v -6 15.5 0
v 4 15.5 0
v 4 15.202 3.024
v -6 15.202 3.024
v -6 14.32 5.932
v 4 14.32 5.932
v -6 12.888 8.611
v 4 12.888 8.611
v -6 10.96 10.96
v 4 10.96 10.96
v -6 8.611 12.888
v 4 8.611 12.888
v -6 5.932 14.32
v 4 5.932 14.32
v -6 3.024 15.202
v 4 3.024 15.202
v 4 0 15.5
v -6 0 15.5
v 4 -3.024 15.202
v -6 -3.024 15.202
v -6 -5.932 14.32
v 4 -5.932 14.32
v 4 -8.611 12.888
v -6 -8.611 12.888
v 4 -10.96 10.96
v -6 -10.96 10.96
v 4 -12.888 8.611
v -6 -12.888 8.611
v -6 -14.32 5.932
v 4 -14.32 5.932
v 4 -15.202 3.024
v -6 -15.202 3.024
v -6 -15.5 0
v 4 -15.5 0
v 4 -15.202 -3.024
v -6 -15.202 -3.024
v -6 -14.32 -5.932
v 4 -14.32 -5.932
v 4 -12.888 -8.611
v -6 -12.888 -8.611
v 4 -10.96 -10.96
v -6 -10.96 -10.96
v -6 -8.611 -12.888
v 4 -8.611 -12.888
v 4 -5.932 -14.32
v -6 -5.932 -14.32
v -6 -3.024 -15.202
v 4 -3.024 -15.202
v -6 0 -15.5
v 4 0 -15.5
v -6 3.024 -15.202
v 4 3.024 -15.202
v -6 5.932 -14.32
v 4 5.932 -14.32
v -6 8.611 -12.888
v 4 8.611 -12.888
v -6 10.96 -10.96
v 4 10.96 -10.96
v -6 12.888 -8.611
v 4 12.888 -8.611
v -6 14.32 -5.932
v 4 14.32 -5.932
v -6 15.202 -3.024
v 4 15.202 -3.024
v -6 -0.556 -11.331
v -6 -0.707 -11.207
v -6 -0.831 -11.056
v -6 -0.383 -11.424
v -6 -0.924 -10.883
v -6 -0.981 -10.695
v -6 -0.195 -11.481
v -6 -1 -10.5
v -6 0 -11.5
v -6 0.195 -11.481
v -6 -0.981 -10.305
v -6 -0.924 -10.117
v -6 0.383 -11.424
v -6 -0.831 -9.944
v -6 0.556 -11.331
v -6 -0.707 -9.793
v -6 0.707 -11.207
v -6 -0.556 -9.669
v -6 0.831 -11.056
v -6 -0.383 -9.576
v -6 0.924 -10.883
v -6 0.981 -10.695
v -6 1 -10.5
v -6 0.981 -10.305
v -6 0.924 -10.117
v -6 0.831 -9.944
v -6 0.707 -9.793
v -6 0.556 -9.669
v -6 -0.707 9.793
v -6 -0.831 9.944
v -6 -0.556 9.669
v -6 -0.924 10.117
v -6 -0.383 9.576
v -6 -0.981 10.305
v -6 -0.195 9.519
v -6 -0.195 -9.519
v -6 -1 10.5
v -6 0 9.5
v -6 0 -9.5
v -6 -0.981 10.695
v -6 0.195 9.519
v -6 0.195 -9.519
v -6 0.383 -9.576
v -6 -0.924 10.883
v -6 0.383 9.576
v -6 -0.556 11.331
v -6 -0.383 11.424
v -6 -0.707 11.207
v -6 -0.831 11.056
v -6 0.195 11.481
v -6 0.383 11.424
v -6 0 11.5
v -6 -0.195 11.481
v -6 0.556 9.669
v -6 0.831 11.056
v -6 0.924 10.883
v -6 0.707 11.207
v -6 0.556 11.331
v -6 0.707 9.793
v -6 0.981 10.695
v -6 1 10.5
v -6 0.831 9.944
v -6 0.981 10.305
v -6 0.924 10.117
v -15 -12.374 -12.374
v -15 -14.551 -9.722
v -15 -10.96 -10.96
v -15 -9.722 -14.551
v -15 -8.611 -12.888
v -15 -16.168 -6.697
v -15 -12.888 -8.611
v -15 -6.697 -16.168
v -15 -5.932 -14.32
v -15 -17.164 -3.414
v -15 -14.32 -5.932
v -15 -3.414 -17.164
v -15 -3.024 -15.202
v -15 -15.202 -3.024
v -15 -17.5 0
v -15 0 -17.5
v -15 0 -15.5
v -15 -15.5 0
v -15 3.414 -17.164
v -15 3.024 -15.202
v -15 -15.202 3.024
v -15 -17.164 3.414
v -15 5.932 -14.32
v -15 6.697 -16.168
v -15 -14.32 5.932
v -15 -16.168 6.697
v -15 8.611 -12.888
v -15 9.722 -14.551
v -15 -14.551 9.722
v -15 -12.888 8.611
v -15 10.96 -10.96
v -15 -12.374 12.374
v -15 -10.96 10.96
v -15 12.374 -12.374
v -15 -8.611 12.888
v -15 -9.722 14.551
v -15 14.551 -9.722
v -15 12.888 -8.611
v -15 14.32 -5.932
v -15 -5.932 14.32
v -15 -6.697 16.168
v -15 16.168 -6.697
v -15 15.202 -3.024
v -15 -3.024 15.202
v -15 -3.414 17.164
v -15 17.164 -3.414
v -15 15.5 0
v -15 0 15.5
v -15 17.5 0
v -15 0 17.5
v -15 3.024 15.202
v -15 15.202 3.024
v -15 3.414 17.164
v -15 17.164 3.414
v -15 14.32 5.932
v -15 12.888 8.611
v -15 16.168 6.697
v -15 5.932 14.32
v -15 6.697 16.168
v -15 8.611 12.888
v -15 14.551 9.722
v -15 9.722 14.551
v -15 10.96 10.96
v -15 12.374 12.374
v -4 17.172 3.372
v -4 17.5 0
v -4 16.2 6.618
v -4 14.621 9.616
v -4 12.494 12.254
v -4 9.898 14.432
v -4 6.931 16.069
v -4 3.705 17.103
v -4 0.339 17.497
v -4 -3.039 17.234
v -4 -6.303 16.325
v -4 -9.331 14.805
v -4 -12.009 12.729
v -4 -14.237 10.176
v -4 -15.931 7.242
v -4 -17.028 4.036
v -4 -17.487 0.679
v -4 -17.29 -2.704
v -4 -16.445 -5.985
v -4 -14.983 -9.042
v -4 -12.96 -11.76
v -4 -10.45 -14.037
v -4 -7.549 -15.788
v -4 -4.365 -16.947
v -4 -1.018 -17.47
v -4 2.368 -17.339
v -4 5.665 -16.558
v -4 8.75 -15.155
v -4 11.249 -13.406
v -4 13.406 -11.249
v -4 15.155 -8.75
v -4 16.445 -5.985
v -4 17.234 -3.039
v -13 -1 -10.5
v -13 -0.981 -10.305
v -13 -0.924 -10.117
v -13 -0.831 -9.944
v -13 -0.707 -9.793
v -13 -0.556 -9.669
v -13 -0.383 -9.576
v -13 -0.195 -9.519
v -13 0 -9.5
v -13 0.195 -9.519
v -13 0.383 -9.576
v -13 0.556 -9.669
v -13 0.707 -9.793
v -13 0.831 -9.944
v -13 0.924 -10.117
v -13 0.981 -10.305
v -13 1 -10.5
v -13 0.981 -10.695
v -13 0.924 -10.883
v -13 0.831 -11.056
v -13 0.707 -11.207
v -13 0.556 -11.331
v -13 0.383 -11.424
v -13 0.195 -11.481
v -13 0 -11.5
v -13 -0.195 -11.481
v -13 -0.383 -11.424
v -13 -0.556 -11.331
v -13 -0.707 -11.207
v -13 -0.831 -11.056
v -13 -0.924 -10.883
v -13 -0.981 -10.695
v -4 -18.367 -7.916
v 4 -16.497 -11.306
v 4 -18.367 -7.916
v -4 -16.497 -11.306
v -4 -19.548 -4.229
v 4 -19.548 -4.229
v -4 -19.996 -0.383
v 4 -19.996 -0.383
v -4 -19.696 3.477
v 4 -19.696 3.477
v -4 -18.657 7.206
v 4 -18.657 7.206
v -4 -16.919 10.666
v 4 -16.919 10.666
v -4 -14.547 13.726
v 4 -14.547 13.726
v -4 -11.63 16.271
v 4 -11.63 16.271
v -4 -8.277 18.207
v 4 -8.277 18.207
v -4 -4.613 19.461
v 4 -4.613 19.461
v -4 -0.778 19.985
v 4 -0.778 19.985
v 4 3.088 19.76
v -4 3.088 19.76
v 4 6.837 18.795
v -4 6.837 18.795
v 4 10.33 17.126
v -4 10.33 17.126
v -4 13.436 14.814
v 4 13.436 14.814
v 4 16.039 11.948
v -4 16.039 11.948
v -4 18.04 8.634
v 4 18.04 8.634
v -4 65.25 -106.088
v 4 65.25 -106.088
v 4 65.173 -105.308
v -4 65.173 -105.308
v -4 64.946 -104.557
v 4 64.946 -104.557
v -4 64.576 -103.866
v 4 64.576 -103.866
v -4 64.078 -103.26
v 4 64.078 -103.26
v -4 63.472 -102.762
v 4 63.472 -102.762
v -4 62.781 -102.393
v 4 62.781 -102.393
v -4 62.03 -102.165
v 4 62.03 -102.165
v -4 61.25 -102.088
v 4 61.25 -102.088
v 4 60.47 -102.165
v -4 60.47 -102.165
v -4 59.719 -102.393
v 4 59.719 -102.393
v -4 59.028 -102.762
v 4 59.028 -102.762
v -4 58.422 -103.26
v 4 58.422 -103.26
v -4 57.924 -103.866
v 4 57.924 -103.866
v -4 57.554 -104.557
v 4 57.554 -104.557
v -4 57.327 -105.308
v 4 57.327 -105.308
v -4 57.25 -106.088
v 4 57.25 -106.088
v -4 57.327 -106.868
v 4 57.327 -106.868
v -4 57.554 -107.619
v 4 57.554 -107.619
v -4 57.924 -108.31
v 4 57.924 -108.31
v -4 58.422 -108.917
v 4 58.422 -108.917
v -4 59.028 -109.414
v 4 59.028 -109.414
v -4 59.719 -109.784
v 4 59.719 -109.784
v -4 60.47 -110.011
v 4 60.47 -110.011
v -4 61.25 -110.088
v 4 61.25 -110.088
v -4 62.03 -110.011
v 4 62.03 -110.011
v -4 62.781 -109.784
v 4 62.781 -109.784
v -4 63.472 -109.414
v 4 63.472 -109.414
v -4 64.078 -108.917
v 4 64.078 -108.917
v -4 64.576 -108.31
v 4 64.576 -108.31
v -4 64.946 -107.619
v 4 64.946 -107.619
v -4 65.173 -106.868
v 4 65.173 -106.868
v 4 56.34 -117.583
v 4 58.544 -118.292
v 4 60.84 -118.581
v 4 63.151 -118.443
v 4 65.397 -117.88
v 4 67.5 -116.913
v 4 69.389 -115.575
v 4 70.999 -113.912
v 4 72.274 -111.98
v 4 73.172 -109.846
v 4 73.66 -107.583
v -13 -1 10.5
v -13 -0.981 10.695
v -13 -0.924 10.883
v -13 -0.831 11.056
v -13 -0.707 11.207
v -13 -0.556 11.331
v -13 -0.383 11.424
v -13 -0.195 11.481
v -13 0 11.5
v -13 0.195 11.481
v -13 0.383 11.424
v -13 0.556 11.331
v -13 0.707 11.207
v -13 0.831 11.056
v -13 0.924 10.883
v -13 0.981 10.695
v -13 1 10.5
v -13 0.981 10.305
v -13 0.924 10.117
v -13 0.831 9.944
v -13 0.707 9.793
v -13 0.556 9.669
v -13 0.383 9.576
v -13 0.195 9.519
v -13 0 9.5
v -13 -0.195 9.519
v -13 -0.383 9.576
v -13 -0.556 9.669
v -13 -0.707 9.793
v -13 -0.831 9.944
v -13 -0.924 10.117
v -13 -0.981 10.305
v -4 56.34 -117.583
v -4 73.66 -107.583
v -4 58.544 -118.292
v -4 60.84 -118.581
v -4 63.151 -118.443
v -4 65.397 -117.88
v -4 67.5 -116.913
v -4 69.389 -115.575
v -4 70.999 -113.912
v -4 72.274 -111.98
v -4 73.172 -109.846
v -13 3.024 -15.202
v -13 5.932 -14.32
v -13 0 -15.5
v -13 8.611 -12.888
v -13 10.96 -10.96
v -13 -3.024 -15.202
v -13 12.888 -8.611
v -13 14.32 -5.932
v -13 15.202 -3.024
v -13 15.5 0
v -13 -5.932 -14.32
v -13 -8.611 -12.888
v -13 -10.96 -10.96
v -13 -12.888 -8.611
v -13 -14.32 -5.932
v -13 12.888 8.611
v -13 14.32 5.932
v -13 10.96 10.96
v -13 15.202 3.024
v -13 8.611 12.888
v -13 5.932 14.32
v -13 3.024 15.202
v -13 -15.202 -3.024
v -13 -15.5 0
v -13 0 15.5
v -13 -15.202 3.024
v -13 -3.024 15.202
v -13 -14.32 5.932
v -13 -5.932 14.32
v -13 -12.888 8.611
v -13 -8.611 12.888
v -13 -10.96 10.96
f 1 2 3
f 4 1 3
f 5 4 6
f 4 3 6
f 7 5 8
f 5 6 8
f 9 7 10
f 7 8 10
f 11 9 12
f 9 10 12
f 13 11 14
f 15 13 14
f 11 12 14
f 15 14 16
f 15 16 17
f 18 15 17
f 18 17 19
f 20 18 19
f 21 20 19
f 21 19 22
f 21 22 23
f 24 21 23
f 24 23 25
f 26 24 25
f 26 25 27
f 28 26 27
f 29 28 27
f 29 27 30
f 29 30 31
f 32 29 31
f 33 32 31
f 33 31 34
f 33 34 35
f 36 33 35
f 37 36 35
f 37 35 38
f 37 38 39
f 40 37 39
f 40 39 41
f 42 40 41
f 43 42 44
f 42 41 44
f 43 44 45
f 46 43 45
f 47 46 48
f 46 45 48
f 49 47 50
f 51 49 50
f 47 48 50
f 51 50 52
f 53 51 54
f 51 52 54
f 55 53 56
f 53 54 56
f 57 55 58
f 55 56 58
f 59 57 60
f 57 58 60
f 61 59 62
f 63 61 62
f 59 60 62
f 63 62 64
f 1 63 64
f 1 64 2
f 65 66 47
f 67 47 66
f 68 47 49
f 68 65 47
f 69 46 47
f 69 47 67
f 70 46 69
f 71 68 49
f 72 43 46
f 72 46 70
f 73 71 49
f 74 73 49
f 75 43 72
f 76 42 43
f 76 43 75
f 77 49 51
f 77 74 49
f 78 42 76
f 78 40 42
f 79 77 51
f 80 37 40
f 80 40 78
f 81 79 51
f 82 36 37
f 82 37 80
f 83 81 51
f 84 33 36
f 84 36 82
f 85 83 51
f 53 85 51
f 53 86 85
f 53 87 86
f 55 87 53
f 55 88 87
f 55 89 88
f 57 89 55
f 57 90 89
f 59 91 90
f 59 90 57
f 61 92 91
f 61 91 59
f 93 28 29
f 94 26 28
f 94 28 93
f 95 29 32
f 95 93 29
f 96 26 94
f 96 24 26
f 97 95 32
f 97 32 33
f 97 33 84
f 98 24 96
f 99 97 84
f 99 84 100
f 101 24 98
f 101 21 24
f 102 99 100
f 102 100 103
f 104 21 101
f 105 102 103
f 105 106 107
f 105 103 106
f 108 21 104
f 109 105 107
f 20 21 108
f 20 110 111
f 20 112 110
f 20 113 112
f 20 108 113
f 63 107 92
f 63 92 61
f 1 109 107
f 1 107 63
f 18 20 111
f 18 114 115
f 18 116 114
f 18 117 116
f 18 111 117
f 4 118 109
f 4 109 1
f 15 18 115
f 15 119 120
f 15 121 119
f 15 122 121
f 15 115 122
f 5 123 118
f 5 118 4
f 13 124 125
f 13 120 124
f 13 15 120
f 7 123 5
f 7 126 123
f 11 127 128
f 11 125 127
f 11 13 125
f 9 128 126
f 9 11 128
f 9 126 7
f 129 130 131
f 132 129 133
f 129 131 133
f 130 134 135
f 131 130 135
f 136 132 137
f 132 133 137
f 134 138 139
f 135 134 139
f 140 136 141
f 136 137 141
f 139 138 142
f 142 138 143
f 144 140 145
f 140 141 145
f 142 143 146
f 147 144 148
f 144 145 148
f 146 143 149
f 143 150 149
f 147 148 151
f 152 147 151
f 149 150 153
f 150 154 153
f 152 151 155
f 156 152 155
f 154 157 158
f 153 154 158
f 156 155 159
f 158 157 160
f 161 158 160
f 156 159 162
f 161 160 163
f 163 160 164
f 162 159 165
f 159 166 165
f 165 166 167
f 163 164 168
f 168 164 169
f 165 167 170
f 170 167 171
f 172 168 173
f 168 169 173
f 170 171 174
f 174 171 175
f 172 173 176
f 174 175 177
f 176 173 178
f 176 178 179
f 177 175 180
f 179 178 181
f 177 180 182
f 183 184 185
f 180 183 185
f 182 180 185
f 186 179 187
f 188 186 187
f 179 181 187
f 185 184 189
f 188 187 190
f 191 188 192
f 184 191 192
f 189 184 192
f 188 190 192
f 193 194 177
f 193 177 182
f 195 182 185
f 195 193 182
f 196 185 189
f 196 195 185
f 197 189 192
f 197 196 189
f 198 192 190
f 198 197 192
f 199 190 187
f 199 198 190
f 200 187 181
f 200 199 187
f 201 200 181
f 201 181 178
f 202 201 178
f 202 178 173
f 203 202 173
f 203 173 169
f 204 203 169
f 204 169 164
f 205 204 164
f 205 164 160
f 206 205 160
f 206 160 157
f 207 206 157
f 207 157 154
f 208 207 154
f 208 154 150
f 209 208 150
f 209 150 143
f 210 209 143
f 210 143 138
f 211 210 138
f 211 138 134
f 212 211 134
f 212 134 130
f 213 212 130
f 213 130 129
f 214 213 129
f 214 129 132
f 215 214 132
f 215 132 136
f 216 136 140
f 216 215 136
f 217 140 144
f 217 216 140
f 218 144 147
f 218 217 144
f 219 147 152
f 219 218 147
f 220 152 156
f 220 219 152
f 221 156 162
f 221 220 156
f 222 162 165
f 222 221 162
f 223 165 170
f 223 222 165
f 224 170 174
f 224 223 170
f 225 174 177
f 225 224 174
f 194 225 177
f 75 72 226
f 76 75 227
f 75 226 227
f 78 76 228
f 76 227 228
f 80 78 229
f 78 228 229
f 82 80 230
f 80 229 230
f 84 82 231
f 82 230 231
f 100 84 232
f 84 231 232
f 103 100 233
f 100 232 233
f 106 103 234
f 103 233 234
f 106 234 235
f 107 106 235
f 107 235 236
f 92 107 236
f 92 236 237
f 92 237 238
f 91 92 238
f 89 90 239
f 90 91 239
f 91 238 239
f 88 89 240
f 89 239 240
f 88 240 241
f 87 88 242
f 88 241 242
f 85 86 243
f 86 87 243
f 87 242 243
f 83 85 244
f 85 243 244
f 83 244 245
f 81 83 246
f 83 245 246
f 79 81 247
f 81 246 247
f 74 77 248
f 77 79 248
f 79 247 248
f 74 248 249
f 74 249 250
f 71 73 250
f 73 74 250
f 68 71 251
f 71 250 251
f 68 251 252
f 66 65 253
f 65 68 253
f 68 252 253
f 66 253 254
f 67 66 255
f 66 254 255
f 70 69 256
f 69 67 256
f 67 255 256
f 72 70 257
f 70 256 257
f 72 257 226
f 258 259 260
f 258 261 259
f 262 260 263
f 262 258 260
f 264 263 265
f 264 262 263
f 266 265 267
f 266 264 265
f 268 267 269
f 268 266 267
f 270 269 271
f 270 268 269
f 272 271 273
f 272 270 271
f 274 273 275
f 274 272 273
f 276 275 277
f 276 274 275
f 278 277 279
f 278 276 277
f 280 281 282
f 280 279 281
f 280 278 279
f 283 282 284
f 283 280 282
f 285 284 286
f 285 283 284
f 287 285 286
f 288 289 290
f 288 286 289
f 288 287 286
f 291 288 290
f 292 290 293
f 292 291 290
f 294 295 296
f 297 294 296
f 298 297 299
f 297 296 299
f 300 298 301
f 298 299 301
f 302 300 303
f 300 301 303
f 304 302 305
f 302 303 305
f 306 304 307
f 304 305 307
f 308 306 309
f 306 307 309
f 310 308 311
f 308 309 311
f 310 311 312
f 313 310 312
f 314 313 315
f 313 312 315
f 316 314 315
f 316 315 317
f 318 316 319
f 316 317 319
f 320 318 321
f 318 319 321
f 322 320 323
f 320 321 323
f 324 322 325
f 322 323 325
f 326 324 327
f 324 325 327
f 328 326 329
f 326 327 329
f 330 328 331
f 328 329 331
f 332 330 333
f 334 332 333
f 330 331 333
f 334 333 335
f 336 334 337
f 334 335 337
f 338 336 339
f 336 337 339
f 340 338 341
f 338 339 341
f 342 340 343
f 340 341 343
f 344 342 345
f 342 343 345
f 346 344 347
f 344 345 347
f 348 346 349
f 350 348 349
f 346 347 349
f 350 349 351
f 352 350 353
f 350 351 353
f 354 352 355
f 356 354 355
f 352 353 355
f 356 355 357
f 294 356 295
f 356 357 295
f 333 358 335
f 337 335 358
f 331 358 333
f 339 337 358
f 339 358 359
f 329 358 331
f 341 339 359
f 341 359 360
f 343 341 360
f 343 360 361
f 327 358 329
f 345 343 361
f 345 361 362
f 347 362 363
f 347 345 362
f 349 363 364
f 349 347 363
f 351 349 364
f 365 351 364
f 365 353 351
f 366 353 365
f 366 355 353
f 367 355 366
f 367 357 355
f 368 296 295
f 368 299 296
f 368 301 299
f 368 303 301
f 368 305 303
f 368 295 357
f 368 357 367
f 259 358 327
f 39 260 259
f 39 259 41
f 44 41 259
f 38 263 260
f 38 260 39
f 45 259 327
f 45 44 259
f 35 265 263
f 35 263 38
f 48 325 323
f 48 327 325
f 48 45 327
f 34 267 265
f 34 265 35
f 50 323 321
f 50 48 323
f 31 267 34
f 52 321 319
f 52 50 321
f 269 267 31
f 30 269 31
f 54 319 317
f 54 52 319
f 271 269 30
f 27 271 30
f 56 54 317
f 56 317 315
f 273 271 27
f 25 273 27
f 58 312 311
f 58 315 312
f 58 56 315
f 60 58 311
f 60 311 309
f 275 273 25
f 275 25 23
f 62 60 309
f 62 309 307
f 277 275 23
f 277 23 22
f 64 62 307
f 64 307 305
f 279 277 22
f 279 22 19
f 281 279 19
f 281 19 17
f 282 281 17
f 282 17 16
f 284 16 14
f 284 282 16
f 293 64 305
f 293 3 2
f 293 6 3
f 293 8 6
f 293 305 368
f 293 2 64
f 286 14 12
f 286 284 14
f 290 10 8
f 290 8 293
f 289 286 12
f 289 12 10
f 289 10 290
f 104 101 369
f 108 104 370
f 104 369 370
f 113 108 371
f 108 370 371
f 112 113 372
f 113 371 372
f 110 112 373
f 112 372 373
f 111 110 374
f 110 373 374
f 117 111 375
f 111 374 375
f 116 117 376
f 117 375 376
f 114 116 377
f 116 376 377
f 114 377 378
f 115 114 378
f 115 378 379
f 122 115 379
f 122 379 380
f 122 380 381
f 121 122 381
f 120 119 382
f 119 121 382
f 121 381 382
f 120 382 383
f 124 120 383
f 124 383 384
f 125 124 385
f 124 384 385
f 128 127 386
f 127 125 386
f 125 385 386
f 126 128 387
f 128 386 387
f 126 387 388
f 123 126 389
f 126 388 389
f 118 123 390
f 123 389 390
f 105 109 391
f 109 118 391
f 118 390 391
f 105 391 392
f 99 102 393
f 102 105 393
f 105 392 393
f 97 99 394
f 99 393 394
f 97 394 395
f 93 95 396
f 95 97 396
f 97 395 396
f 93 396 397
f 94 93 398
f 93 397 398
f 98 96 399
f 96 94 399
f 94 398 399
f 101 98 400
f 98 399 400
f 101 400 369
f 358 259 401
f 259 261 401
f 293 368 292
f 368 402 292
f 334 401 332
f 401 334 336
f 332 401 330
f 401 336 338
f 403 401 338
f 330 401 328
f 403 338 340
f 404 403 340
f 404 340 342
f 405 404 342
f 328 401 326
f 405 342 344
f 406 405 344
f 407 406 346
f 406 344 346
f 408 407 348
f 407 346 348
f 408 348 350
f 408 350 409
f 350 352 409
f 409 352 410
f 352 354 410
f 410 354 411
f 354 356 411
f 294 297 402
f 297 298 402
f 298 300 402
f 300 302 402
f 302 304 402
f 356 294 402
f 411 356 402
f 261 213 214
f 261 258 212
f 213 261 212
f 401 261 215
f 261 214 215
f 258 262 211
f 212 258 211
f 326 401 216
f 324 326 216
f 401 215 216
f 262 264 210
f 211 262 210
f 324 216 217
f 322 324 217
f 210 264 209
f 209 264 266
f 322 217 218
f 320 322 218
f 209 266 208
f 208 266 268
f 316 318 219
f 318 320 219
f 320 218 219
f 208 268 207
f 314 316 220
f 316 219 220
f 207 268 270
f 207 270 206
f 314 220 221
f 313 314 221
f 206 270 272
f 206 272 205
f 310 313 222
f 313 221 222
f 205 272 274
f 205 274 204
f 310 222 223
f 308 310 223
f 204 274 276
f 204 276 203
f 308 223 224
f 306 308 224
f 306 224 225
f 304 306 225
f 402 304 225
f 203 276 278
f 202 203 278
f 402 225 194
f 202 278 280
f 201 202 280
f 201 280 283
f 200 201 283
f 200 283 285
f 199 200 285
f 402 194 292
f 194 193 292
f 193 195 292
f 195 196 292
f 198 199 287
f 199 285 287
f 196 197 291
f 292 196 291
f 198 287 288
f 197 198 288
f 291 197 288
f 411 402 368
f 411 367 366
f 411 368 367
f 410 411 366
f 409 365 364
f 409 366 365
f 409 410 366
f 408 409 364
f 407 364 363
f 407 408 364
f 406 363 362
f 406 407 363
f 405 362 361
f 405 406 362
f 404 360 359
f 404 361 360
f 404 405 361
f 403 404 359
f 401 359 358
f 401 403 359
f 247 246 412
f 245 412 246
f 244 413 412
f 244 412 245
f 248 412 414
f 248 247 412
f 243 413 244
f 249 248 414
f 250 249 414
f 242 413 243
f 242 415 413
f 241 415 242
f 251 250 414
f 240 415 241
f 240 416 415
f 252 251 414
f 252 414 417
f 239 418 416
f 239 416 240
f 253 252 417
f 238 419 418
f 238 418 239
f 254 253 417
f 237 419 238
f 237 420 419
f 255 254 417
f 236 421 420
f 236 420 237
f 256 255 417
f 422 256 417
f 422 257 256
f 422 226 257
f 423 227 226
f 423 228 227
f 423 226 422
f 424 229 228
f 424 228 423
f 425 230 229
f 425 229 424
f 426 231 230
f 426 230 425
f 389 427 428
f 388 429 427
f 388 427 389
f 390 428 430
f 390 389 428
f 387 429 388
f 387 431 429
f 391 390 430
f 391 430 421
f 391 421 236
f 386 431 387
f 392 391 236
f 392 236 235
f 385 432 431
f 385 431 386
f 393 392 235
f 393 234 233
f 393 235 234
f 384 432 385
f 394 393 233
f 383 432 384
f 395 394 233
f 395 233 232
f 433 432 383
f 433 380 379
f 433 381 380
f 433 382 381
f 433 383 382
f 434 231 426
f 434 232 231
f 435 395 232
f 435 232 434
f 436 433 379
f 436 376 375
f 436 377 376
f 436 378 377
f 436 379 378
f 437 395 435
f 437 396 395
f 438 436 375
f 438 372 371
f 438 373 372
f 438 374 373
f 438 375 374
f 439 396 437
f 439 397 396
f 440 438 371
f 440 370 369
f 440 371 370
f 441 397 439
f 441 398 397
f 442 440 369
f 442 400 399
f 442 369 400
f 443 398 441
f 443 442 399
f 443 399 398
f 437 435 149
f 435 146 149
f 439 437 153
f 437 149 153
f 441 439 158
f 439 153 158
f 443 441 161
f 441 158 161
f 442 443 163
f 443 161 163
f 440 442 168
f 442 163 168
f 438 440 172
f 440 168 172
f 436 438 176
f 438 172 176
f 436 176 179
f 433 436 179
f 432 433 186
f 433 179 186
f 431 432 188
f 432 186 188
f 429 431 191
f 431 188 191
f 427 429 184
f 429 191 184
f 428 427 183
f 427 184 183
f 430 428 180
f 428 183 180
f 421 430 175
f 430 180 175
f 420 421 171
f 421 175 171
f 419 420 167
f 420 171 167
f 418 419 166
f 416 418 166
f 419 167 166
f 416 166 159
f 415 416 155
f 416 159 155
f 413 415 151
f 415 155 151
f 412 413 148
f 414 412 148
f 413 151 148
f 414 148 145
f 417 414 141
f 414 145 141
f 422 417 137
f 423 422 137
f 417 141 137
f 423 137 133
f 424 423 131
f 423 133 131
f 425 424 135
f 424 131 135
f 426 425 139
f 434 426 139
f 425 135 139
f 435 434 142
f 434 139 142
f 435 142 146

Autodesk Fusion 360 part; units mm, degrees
sketch "Sketch1" plane through (0, 0, 0) normal (1, 0, 0) x (0, 1, 0)
  circle A0 centre (0, 0) radius 20
  line L0 (0, 0) -> (65, -112.5833)
  line L1 (0, 0) -> (130, 0) construction
  line L2 (-16.4974, -11.3065) -> (56.3397, -117.5833)
  line L3 (56.3397, -117.5833) -> (65, -112.5833)
  line L4 (65, -112.5833) -> (73.6603, -107.5833)
  line L5 (73.6603, -107.5833) -> (18.0404, 8.6339)
  circle A1 centre (0, 0) radius 17.5
  circle A2 centre (61.25, -106.0881) radius 12.5
  circle A3 centre (61.25, -106.0881) radius 7.5
  dimension "d1" = 40
  dimension "d2" = 60
  dimension "d3" = 130
  dimension "d4" = 10
  dimension "d5" = 10
  dimension "d6" = 35
  dimension "d7" = 25
  dimension "d8" = 15
extrude "Extrude1" add sketch "Sketch1" along normal mid plane 8 contours A1 | A0 | A0 L0 L5 A2 | A0 L0 L2 A2 | L0 L4 L5 A2 A3 | L0 L2 L3 A2 A3 | L3 L4 A2 | L0 A3 | L0 A3
extrude "Extrude2" add sketch "Sketch1" against normal blind 15 contours A1
extrude "Extrude3" add sketch "Sketch1" along normal mid plane 20 contours L0 A3 | L0 A3
extrude "Extrude4" cut 1 faces at (10, 60.7061, -108.3596) along direction (-1, 0, 0) blind 6
extrude "Extrude5" cut 1 faces at (-10, 60.6937, -103.8711) along direction (1, 0, 0) blind 6
sketch "Sketch2" plane through (-15, 0, 0) normal (-1, 0, 0) x (0, -1, 0)
  circle A0 centre (0, 0) radius 17.5
  line L0 (0, 0) -> (0, 10.5)
  line L1 (0, 0) -> (0, -10.5)
  circle A1 centre (0, 10.5) radius 1
  circle A2 centre (0, -10.5) radius 1
  dimension "d19" = 10.5
  dimension "d20" = 10.5
  dimension "d21" = 2
  dimension "d22" = 2
extrude "Extrude6" cut sketch "Sketch2" against normal blind 26 contours A1 | A2
sketch "Sketch3" plane through (-15, 0, 0) normal (-1, 0, 0) x (0, -1, 0)
  circle A0 centre (0, 10.5) radius 1
  circle A1 centre (0, -10.5) radius 1
  circle A2 centre (0, 0) radius 17.5
  circle A3 centre (0, 0) radius 15.5
  dimension "d25" = 31
extrude "Extrude7" cut sketch "Sketch3" against normal blind 2 contours A3
sketch "Sketch4" plane through (4, 0, 0) normal (1, 0, 0) x (0, 1, 0)
  circle A0 centre (0, 10.5) radius 1
  circle A1 centre (0, -10.5) radius 1
  line L0 (73.6603, -107.5833) -> (18.0404, 8.6339)
  arc A2 (18.0404, 8.6339) -> (-16.4974, -11.3065) centre (0, 0) ccw
  line L1 (-16.4974, -11.3065) -> (56.3397, -117.5833)
  arc A3 (56.3397, -117.5833) -> (73.6603, -107.5833) centre (61.25, -106.0881) ccw
  circle A4 centre (0, 0) radius 15.5
  circle A5 centre (0, 0) radius 15.5
extrude "Extrude8" cut sketch "Sketch4" against normal blind 10 contours A4 A5
sketch "Sketch5" plane through (4, 0, 0) normal (1, 0, 0) x (0, 1, 0)
  circle A0 centre (0, 0) radius 15.5
  line L0 (73.6603, -107.5833) -> (18.0404, 8.6339)
  arc A1 (18.0404, 8.6339) -> (-16.4974, -11.3065) centre (0, 0) ccw
  line L1 (-16.4974, -11.3065) -> (56.3397, -117.5833)
  arc A2 (56.3397, -117.5833) -> (73.6603, -107.5833) centre (61.25, -106.0881) ccw
  circle A3 centre (61.25, -106.0881) radius 12.5
  circle A4 centre (61.25, -106.0881) radius 4
  dimension "d30" = 8
extrude "Extrude9" cut sketch "Sketch5" against normal blind 10 contours A4
equation "d19 = ( 21 / 2 ) * 1 mm"
